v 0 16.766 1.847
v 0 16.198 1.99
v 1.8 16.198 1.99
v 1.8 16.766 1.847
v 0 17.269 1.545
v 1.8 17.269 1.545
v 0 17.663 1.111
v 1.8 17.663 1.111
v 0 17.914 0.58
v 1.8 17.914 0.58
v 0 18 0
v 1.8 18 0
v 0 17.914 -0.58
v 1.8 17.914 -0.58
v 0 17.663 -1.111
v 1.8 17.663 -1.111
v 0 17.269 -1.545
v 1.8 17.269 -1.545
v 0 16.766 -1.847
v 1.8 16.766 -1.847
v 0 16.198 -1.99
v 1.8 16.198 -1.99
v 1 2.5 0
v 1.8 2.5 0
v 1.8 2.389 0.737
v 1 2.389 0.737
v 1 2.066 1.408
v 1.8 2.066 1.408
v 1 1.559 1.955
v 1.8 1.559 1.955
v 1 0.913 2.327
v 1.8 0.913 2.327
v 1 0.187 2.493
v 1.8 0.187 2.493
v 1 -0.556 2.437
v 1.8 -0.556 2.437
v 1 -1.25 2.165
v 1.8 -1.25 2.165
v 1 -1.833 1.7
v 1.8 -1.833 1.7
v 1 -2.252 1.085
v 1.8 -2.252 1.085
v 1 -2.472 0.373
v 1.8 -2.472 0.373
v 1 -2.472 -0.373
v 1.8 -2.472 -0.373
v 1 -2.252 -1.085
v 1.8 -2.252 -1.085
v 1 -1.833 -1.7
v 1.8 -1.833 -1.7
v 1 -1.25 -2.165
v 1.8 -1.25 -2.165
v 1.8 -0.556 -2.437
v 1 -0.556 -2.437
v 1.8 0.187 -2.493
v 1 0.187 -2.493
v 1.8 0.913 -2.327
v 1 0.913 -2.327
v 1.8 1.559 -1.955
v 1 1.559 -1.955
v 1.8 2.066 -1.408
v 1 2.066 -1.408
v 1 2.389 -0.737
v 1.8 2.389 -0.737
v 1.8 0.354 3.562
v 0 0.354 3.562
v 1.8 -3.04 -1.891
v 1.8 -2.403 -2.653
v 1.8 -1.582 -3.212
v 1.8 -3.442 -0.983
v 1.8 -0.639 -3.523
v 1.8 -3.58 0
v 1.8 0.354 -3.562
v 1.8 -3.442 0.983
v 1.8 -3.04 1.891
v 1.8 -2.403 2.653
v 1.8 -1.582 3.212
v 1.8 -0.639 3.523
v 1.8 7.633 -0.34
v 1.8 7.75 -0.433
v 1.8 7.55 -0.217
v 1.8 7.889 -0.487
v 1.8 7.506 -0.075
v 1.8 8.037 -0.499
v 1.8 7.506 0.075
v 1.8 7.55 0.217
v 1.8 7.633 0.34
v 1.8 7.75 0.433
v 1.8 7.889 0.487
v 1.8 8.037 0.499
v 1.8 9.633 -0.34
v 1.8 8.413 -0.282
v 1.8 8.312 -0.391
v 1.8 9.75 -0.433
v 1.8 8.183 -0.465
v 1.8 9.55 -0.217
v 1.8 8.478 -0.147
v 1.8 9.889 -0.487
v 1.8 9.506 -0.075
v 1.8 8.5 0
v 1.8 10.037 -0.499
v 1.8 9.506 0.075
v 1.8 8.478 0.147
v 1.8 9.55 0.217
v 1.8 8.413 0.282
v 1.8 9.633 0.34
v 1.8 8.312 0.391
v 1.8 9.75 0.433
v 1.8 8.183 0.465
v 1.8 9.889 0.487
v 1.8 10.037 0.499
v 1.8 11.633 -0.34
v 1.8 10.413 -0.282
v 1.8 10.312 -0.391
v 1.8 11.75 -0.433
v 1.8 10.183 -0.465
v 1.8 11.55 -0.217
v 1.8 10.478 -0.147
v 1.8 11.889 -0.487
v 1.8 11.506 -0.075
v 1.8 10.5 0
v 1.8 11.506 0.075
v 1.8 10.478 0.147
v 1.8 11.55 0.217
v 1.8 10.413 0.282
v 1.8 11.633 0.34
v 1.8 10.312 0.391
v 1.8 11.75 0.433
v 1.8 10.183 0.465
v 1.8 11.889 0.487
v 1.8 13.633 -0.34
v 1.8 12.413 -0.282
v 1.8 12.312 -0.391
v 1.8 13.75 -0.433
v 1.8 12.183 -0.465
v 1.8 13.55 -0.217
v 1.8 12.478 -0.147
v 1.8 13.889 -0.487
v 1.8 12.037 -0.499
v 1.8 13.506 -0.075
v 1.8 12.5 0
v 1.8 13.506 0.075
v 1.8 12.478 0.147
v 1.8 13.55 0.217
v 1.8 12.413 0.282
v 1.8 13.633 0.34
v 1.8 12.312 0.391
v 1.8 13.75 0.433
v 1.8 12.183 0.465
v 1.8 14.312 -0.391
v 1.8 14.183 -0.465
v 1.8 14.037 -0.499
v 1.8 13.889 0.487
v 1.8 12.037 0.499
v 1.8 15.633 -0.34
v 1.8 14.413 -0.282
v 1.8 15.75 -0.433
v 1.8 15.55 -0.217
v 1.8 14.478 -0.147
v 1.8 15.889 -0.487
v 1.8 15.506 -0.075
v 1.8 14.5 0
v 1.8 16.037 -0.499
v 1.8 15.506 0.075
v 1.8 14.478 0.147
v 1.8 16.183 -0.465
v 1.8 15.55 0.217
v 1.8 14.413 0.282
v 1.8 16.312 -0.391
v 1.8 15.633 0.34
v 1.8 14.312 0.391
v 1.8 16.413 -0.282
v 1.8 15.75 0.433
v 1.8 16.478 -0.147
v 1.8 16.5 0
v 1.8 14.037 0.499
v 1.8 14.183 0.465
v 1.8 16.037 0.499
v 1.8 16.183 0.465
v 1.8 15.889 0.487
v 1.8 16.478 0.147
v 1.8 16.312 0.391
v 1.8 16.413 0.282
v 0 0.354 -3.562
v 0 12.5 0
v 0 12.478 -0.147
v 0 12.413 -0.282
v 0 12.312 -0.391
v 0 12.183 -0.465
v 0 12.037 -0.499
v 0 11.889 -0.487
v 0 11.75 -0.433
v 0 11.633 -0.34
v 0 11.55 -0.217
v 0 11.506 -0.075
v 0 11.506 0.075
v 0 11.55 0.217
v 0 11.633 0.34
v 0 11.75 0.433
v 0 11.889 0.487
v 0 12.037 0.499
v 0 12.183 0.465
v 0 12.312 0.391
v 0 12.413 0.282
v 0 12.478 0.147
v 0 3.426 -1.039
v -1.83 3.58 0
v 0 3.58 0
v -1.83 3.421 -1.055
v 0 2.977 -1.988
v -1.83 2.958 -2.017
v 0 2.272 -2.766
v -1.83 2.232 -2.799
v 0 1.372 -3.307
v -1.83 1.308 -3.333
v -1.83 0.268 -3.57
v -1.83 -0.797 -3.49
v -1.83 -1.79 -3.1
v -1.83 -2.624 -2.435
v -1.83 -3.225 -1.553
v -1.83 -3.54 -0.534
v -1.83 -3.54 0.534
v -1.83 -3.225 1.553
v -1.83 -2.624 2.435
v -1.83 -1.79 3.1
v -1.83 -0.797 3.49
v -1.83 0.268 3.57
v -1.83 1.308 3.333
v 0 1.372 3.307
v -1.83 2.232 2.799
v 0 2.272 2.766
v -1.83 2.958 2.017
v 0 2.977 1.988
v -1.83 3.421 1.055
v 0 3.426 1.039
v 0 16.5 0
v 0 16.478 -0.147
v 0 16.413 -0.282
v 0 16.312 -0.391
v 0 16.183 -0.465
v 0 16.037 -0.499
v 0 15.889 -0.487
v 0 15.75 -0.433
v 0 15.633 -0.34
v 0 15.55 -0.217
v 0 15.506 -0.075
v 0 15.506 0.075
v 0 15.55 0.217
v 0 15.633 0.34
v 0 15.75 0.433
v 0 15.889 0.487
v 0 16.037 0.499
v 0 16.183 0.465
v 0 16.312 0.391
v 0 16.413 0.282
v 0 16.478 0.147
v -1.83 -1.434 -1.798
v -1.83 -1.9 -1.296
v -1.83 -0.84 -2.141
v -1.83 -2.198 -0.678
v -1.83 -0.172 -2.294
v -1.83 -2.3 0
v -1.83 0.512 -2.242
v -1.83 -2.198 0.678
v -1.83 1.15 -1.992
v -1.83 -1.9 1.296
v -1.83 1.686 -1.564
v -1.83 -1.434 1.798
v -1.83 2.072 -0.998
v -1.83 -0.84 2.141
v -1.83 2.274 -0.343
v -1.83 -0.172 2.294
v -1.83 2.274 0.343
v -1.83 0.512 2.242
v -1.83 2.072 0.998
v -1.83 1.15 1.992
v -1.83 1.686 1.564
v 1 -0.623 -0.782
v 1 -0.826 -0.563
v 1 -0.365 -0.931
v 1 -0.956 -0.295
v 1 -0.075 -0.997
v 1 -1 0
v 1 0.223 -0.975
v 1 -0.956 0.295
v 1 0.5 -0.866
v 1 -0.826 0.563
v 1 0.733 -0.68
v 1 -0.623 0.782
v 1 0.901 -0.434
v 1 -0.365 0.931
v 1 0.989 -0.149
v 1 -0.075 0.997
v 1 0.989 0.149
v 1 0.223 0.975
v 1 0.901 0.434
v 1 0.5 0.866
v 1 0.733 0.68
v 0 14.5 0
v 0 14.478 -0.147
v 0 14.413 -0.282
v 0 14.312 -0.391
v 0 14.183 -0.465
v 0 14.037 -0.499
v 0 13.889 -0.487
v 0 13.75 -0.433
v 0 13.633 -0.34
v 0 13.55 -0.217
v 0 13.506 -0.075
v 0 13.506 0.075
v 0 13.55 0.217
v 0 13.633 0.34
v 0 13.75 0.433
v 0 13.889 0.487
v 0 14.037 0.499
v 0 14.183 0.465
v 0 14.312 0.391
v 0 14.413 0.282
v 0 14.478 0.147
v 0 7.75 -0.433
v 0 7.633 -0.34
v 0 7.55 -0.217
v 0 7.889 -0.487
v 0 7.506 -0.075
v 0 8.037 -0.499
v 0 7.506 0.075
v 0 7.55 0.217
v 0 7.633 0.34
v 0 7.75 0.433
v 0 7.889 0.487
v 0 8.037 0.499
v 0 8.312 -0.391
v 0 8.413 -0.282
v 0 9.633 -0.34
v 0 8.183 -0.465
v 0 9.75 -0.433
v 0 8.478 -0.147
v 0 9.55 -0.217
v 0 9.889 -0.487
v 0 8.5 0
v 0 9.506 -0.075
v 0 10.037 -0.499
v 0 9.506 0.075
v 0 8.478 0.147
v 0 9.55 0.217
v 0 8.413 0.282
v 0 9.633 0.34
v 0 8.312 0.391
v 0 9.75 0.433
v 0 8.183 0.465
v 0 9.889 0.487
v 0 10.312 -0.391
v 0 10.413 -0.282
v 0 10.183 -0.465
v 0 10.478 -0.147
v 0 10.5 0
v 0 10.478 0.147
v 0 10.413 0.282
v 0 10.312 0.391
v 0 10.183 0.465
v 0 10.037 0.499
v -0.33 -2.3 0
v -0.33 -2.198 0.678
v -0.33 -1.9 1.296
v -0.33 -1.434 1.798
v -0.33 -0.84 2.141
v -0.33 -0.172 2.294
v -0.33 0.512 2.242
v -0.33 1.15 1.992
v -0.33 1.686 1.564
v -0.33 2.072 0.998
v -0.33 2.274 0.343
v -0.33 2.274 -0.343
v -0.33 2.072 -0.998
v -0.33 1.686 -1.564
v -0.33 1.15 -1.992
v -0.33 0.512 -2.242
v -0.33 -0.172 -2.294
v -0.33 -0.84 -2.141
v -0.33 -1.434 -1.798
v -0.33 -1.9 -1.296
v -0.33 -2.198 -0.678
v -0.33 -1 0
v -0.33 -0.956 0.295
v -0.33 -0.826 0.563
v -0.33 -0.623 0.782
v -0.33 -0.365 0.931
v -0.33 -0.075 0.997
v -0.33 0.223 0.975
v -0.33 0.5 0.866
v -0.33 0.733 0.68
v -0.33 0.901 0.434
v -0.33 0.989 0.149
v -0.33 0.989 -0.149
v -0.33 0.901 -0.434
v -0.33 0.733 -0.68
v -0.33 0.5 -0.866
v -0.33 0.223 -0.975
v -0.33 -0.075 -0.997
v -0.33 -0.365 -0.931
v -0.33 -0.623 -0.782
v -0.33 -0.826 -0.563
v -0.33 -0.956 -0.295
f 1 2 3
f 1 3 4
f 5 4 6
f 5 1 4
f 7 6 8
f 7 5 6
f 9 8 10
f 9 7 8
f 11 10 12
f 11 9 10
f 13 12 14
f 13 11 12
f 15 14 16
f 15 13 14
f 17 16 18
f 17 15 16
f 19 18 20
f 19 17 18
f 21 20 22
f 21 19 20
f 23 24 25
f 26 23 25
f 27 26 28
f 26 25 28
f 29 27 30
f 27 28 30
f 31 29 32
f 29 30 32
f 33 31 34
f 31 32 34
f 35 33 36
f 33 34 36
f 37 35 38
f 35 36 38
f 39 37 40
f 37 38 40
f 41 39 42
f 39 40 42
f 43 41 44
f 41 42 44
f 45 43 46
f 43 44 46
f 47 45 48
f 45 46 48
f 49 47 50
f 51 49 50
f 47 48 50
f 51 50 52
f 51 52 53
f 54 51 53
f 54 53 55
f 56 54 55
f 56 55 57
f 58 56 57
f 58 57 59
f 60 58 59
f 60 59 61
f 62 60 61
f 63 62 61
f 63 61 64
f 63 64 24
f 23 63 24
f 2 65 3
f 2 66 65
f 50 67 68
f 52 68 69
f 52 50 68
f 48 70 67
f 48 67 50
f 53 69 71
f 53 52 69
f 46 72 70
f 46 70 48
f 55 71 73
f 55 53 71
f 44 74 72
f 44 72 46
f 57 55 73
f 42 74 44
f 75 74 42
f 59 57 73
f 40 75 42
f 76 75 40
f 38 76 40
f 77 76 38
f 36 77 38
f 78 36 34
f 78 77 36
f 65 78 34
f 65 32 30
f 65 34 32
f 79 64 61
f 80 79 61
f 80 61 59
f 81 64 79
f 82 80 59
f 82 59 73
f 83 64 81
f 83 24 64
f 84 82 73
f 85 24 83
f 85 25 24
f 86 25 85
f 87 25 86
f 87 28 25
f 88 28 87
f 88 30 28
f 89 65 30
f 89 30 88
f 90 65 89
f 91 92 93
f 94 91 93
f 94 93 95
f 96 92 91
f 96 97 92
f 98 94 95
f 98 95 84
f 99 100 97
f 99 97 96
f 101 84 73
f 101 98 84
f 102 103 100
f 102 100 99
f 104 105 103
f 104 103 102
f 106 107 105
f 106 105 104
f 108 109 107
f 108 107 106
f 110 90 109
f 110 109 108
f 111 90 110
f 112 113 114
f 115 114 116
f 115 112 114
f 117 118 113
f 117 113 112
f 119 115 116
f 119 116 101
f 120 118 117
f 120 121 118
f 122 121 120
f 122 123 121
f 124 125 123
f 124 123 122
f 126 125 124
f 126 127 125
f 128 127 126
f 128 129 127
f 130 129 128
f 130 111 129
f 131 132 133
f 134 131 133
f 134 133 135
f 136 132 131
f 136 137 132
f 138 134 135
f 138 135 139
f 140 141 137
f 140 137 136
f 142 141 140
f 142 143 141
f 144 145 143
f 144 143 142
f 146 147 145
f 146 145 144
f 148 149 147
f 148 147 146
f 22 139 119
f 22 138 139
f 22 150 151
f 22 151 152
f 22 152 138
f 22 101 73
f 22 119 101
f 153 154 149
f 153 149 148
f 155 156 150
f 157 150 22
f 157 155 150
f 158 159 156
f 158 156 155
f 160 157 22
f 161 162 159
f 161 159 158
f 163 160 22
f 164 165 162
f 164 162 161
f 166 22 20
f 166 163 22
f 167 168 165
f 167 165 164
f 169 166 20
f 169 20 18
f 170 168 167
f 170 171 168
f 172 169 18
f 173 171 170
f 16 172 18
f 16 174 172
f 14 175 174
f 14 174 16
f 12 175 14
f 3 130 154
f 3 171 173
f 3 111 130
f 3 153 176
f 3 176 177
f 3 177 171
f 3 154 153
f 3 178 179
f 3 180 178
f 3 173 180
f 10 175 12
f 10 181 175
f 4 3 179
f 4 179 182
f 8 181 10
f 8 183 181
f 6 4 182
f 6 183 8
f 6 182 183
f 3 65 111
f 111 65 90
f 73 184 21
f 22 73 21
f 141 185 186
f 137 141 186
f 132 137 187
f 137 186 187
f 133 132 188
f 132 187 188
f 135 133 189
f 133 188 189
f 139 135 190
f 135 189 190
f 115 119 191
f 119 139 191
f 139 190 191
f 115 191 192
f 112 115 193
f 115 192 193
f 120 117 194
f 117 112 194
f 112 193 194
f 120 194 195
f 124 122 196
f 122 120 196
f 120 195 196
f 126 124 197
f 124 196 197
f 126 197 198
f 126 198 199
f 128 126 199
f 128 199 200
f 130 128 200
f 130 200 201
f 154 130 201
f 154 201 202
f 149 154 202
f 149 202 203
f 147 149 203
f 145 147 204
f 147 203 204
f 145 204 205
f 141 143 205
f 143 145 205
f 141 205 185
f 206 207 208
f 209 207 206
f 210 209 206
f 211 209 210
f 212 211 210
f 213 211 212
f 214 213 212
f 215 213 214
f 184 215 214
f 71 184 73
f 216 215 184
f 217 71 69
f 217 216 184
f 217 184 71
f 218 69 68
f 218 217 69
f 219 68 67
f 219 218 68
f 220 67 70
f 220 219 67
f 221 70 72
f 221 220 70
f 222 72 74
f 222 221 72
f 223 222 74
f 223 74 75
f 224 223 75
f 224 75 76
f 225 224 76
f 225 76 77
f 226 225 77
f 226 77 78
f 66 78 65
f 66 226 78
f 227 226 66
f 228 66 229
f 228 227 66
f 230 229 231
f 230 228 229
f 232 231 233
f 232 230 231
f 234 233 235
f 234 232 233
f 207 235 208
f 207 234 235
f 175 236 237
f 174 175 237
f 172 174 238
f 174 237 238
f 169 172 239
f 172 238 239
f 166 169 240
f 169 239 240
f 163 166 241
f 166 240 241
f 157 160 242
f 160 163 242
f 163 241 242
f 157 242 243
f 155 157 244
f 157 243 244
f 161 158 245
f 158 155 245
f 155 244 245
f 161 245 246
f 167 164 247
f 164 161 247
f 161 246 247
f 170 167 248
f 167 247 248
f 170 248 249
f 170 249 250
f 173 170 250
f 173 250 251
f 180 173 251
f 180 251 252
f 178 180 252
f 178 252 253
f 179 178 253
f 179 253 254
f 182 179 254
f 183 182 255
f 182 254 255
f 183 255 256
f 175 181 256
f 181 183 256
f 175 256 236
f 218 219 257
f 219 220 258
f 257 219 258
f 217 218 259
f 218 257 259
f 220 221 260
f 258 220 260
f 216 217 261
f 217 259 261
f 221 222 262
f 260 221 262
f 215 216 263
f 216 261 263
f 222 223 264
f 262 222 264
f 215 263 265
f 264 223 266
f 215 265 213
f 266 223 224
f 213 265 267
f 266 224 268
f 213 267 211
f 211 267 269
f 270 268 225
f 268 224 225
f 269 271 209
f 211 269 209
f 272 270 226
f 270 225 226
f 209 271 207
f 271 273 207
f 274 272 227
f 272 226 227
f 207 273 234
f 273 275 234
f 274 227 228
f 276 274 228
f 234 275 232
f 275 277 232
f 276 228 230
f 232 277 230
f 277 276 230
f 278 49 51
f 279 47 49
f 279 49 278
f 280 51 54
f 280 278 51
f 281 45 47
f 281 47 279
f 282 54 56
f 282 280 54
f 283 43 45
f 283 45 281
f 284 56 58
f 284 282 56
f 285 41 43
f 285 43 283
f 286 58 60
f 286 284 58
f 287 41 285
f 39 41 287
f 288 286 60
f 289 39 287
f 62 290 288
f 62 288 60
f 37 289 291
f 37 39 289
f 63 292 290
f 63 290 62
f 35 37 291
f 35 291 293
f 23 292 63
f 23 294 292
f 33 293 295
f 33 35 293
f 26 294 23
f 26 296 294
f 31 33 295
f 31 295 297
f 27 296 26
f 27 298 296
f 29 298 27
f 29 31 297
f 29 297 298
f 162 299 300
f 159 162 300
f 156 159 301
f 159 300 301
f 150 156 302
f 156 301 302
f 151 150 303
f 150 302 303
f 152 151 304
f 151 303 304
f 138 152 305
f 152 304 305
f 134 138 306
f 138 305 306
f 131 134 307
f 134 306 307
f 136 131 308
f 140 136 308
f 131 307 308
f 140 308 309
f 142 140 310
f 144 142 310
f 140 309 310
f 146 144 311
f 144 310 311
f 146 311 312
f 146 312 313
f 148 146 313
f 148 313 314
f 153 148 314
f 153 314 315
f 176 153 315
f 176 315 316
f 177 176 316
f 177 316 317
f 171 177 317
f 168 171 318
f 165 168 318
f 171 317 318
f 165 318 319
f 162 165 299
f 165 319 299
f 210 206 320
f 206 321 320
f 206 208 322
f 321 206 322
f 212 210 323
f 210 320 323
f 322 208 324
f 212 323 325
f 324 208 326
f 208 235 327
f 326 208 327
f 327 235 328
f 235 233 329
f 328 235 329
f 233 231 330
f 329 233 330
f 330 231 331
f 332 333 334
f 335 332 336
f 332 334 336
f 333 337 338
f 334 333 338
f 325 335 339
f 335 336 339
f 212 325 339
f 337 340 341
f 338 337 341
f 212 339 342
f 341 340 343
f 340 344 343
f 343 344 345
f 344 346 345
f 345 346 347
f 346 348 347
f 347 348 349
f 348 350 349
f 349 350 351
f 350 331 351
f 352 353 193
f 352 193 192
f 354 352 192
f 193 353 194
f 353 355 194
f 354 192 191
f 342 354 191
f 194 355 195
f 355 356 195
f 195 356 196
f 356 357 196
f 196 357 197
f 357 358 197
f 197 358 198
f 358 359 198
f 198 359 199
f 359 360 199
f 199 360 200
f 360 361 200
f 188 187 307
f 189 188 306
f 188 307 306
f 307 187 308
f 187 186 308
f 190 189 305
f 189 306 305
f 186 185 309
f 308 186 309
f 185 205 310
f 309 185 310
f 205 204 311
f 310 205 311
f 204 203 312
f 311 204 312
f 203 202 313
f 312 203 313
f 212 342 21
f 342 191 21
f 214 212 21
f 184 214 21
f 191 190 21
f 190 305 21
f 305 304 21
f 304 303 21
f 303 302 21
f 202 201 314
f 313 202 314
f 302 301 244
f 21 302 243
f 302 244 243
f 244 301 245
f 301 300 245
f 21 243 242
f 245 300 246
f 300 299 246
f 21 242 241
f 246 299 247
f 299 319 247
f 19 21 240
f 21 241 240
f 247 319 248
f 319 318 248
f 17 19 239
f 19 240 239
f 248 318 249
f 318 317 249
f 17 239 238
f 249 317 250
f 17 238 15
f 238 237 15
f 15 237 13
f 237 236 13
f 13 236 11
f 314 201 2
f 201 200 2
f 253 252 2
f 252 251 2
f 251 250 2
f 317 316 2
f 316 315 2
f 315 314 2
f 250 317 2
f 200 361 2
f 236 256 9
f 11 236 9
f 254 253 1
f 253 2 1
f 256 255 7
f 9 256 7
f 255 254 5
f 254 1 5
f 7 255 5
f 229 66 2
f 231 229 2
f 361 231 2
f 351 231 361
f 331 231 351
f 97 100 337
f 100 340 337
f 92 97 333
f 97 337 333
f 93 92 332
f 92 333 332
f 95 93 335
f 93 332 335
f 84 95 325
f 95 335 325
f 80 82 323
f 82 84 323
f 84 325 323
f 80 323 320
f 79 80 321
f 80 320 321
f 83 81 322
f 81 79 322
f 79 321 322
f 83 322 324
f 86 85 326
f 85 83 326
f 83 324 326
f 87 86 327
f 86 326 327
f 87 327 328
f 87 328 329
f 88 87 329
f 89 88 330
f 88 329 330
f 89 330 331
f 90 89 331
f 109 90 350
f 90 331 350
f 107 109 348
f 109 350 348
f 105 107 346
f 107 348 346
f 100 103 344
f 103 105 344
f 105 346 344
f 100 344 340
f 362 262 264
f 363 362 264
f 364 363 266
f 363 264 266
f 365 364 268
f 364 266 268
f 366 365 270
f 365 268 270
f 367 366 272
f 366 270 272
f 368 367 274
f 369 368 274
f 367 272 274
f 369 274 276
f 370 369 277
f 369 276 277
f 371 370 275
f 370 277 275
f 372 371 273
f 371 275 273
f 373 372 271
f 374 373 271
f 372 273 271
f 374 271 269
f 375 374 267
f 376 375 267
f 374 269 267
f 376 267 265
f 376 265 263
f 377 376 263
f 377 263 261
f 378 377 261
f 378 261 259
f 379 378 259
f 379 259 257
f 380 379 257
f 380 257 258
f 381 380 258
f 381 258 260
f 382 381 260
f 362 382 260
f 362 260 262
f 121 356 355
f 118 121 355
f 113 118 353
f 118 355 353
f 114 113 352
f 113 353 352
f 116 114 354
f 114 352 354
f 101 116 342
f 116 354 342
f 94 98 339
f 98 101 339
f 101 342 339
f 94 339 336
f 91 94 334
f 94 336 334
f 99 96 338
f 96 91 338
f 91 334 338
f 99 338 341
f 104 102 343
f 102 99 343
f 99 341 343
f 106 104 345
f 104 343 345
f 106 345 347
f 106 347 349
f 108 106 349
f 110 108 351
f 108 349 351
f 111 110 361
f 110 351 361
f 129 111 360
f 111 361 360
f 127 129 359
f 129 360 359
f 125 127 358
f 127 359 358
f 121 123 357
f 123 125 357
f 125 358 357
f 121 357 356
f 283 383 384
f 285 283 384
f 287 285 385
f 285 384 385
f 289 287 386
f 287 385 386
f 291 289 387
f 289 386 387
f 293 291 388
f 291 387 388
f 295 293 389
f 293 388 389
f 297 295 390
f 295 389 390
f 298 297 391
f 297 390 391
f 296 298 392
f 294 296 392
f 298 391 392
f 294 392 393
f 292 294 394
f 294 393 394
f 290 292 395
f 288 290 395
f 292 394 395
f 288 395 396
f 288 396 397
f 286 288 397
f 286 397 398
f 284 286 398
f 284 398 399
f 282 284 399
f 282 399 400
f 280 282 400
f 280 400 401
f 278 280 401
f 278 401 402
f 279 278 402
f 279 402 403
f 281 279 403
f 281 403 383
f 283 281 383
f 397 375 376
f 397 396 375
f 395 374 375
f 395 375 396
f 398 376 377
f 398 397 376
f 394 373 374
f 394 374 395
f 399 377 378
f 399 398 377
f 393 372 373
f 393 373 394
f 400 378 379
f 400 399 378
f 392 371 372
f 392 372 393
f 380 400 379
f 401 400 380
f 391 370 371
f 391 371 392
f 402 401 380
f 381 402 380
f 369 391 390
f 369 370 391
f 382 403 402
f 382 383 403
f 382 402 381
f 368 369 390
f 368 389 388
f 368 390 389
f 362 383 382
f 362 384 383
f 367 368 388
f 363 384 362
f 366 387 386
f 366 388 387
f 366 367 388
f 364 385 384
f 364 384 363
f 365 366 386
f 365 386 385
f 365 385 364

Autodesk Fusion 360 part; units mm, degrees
sketch "Sketch1" plane through (0, 0, 0) normal (1, 0, 0) x (0, 1, 0)
  circle A0 centre (0, 0) radius 3.58
  circle A1 centre (16, 0) radius 2
  line L0 (0.3535, 3.5625) -> (16.1975, 1.9902)
  line L1 (0.3535, -3.5625) -> (16.1975, -1.9902)
  circle A2 centre (16, 0) radius 0.5
  circle A3 centre (14, 0) radius 0.5
  circle A4 centre (12, 0) radius 0.5
  circle A5 centre (10, 0) radius 0.5
  circle A6 centre (8, 0) radius 0.5
  line L2 (0, 7) -> (0, -7.5)
  circle A7 centre (-8, 0) radius 0.5
  circle A8 centre (-10, 0) radius 0.5
  line L3 (-0.3535, 3.5625) -> (-16.1975, 1.9902)
  circle A9 centre (-12, 0) radius 0.5
  circle A10 centre (-14, 0) radius 0.5
  circle A11 centre (-16, 0) radius 2
  circle A12 centre (-16, 0) radius 0.5
  line L4 (-0.3535, -3.5625) -> (-16.1975, -1.9902)
  dimension "d4" = 7.16
  dimension "d5" = 4
  dimension "d6" = 16
  dimension "d7" = 1
  dimension "d10" = -8
  dimension "d11" = 0
extrude "Extrude1" add sketch "Sketch1" along normal blind 1.8 contours A0 L2 | A0 A1 L0 L1 A3 | A0 L2 | A1 A3 | A0 L3 A10 A11 L4 | A10 A11 picked at (14.8153, -0.6023) picked at (-14.8153, -0.6023) makes body 1
extrude "Extrude2" add sketch "Sketch1" along normal blind 1.8 separate body contours A0 L2 | A0 A1 L0 L1 A3 | A0 L2 | A1 A3 picked at (14.8153, -0.6023) makes body 2
sketch "Sketch2" plane through (0, 0, 0) normal (1, 0, 0) x (0, 1, 0)
extrude "Extrude3" add sketch "Sketch1" against normal blind 1.83 contours A0 L2 | A0 L2 bodies 1
sketch "Sketch3" plane through (1.8, 0, 0) normal (1, 0, 0) x (0, 1, 0)
  circle A0 centre (-10, 0) radius 0.5
  circle A1 centre (10, 0) radius 0.5
  circle A2 centre (-12, 0) radius 0.5
  circle A3 centre (12, 0) radius 0.5
  circle A4 centre (-8, 0) radius 0.5
  circle A5 centre (16, 0) radius 0.5
  circle A6 centre (-16, 0) radius 0.5
  circle A7 centre (14, 0) radius 0.5
  circle A8 centre (8, 0) radius 0.5
  circle A9 centre (-14, 0) radius 0.5
  line L0 (0.3535, -3.5625) -> (16.1975, -1.9902)
  arc A10 (16.1975, -1.9902) -> (16.1975, 1.9902) centre (16, 0) ccw
  line L1 (16.1975, 1.9902) -> (0.3535, 3.5625)
  arc A11 (0.3535, 3.5625) -> (-0.3535, 3.5625) centre (0, 0) ccw
  line L2 (-0.3535, 3.5625) -> (-16.1975, 1.9902)
  arc A12 (-16.1975, 1.9902) -> (-16.1975, -1.9902) centre (-16, 0) ccw
  line L3 (-16.1975, -1.9902) -> (-0.3535, -3.5625)
  arc A13 (-0.3535, -3.5625) -> (0.3535, -3.5625) centre (0, 0) ccw
  circle A14 centre (0, 0) radius 2.5
  circle A15 centre (0, 0) radius 3.58
  dimension "d18" = 5
extrude "Extrude4" cut sketch "Sketch3" against normal blind 0.8 contours A14 bodies 1
sketch "Sketch4" plane through (1, 0, 0) normal (1, 0, 0) x (0, 1, 0)
  circle A0 centre (0, 0) radius 2.5
  circle A1 centre (0, 0) radius 2.5
  circle A2 centre (0, 0) radius 1
  dimension "d21" = 2
extrude "Extrude5" cut sketch "Sketch4" against normal blind 13.5 contours A2 bodies 1
sketch "Sketch5" plane through (-1.83, 0, 0) normal (-1, 0, 0) x (0, -1, 0)
  circle A0 centre (0, 0) radius 1
  circle A1 centre (0, 0) radius 3.58
  circle A2 centre (0, 0) radius 2.3
  dimension "d24" = 4.6
extrude "Extrude6" cut sketch "Sketch5" against normal blind 1.5 contours A2 bodies 1
extrude "Extrude7" add sketch "Sketch1" against normal blind 1.83 contours A0 L2 | A0 L2 bodies 2
extrude "Extrude8" cut sketch "Sketch3" against normal blind 0.8 contours A14 bodies 2
extrude "Extrude9" cut sketch "Sketch5" against normal blind 1.5 contours A2 bodies 2
extrude "Extrude10" cut 1 faces at (-1.83, 0.6188, -0.2429) along direction (1, 0, 0) blind 27.5 on bodies 2 bodies 2
hidden bodies 1
equation "d4 = 3.58 * 2 mm"
equation "d16 = -3.43 mm + 1.6 mm"
equation "d27 = -3.43 mm + 1.6 mm"
